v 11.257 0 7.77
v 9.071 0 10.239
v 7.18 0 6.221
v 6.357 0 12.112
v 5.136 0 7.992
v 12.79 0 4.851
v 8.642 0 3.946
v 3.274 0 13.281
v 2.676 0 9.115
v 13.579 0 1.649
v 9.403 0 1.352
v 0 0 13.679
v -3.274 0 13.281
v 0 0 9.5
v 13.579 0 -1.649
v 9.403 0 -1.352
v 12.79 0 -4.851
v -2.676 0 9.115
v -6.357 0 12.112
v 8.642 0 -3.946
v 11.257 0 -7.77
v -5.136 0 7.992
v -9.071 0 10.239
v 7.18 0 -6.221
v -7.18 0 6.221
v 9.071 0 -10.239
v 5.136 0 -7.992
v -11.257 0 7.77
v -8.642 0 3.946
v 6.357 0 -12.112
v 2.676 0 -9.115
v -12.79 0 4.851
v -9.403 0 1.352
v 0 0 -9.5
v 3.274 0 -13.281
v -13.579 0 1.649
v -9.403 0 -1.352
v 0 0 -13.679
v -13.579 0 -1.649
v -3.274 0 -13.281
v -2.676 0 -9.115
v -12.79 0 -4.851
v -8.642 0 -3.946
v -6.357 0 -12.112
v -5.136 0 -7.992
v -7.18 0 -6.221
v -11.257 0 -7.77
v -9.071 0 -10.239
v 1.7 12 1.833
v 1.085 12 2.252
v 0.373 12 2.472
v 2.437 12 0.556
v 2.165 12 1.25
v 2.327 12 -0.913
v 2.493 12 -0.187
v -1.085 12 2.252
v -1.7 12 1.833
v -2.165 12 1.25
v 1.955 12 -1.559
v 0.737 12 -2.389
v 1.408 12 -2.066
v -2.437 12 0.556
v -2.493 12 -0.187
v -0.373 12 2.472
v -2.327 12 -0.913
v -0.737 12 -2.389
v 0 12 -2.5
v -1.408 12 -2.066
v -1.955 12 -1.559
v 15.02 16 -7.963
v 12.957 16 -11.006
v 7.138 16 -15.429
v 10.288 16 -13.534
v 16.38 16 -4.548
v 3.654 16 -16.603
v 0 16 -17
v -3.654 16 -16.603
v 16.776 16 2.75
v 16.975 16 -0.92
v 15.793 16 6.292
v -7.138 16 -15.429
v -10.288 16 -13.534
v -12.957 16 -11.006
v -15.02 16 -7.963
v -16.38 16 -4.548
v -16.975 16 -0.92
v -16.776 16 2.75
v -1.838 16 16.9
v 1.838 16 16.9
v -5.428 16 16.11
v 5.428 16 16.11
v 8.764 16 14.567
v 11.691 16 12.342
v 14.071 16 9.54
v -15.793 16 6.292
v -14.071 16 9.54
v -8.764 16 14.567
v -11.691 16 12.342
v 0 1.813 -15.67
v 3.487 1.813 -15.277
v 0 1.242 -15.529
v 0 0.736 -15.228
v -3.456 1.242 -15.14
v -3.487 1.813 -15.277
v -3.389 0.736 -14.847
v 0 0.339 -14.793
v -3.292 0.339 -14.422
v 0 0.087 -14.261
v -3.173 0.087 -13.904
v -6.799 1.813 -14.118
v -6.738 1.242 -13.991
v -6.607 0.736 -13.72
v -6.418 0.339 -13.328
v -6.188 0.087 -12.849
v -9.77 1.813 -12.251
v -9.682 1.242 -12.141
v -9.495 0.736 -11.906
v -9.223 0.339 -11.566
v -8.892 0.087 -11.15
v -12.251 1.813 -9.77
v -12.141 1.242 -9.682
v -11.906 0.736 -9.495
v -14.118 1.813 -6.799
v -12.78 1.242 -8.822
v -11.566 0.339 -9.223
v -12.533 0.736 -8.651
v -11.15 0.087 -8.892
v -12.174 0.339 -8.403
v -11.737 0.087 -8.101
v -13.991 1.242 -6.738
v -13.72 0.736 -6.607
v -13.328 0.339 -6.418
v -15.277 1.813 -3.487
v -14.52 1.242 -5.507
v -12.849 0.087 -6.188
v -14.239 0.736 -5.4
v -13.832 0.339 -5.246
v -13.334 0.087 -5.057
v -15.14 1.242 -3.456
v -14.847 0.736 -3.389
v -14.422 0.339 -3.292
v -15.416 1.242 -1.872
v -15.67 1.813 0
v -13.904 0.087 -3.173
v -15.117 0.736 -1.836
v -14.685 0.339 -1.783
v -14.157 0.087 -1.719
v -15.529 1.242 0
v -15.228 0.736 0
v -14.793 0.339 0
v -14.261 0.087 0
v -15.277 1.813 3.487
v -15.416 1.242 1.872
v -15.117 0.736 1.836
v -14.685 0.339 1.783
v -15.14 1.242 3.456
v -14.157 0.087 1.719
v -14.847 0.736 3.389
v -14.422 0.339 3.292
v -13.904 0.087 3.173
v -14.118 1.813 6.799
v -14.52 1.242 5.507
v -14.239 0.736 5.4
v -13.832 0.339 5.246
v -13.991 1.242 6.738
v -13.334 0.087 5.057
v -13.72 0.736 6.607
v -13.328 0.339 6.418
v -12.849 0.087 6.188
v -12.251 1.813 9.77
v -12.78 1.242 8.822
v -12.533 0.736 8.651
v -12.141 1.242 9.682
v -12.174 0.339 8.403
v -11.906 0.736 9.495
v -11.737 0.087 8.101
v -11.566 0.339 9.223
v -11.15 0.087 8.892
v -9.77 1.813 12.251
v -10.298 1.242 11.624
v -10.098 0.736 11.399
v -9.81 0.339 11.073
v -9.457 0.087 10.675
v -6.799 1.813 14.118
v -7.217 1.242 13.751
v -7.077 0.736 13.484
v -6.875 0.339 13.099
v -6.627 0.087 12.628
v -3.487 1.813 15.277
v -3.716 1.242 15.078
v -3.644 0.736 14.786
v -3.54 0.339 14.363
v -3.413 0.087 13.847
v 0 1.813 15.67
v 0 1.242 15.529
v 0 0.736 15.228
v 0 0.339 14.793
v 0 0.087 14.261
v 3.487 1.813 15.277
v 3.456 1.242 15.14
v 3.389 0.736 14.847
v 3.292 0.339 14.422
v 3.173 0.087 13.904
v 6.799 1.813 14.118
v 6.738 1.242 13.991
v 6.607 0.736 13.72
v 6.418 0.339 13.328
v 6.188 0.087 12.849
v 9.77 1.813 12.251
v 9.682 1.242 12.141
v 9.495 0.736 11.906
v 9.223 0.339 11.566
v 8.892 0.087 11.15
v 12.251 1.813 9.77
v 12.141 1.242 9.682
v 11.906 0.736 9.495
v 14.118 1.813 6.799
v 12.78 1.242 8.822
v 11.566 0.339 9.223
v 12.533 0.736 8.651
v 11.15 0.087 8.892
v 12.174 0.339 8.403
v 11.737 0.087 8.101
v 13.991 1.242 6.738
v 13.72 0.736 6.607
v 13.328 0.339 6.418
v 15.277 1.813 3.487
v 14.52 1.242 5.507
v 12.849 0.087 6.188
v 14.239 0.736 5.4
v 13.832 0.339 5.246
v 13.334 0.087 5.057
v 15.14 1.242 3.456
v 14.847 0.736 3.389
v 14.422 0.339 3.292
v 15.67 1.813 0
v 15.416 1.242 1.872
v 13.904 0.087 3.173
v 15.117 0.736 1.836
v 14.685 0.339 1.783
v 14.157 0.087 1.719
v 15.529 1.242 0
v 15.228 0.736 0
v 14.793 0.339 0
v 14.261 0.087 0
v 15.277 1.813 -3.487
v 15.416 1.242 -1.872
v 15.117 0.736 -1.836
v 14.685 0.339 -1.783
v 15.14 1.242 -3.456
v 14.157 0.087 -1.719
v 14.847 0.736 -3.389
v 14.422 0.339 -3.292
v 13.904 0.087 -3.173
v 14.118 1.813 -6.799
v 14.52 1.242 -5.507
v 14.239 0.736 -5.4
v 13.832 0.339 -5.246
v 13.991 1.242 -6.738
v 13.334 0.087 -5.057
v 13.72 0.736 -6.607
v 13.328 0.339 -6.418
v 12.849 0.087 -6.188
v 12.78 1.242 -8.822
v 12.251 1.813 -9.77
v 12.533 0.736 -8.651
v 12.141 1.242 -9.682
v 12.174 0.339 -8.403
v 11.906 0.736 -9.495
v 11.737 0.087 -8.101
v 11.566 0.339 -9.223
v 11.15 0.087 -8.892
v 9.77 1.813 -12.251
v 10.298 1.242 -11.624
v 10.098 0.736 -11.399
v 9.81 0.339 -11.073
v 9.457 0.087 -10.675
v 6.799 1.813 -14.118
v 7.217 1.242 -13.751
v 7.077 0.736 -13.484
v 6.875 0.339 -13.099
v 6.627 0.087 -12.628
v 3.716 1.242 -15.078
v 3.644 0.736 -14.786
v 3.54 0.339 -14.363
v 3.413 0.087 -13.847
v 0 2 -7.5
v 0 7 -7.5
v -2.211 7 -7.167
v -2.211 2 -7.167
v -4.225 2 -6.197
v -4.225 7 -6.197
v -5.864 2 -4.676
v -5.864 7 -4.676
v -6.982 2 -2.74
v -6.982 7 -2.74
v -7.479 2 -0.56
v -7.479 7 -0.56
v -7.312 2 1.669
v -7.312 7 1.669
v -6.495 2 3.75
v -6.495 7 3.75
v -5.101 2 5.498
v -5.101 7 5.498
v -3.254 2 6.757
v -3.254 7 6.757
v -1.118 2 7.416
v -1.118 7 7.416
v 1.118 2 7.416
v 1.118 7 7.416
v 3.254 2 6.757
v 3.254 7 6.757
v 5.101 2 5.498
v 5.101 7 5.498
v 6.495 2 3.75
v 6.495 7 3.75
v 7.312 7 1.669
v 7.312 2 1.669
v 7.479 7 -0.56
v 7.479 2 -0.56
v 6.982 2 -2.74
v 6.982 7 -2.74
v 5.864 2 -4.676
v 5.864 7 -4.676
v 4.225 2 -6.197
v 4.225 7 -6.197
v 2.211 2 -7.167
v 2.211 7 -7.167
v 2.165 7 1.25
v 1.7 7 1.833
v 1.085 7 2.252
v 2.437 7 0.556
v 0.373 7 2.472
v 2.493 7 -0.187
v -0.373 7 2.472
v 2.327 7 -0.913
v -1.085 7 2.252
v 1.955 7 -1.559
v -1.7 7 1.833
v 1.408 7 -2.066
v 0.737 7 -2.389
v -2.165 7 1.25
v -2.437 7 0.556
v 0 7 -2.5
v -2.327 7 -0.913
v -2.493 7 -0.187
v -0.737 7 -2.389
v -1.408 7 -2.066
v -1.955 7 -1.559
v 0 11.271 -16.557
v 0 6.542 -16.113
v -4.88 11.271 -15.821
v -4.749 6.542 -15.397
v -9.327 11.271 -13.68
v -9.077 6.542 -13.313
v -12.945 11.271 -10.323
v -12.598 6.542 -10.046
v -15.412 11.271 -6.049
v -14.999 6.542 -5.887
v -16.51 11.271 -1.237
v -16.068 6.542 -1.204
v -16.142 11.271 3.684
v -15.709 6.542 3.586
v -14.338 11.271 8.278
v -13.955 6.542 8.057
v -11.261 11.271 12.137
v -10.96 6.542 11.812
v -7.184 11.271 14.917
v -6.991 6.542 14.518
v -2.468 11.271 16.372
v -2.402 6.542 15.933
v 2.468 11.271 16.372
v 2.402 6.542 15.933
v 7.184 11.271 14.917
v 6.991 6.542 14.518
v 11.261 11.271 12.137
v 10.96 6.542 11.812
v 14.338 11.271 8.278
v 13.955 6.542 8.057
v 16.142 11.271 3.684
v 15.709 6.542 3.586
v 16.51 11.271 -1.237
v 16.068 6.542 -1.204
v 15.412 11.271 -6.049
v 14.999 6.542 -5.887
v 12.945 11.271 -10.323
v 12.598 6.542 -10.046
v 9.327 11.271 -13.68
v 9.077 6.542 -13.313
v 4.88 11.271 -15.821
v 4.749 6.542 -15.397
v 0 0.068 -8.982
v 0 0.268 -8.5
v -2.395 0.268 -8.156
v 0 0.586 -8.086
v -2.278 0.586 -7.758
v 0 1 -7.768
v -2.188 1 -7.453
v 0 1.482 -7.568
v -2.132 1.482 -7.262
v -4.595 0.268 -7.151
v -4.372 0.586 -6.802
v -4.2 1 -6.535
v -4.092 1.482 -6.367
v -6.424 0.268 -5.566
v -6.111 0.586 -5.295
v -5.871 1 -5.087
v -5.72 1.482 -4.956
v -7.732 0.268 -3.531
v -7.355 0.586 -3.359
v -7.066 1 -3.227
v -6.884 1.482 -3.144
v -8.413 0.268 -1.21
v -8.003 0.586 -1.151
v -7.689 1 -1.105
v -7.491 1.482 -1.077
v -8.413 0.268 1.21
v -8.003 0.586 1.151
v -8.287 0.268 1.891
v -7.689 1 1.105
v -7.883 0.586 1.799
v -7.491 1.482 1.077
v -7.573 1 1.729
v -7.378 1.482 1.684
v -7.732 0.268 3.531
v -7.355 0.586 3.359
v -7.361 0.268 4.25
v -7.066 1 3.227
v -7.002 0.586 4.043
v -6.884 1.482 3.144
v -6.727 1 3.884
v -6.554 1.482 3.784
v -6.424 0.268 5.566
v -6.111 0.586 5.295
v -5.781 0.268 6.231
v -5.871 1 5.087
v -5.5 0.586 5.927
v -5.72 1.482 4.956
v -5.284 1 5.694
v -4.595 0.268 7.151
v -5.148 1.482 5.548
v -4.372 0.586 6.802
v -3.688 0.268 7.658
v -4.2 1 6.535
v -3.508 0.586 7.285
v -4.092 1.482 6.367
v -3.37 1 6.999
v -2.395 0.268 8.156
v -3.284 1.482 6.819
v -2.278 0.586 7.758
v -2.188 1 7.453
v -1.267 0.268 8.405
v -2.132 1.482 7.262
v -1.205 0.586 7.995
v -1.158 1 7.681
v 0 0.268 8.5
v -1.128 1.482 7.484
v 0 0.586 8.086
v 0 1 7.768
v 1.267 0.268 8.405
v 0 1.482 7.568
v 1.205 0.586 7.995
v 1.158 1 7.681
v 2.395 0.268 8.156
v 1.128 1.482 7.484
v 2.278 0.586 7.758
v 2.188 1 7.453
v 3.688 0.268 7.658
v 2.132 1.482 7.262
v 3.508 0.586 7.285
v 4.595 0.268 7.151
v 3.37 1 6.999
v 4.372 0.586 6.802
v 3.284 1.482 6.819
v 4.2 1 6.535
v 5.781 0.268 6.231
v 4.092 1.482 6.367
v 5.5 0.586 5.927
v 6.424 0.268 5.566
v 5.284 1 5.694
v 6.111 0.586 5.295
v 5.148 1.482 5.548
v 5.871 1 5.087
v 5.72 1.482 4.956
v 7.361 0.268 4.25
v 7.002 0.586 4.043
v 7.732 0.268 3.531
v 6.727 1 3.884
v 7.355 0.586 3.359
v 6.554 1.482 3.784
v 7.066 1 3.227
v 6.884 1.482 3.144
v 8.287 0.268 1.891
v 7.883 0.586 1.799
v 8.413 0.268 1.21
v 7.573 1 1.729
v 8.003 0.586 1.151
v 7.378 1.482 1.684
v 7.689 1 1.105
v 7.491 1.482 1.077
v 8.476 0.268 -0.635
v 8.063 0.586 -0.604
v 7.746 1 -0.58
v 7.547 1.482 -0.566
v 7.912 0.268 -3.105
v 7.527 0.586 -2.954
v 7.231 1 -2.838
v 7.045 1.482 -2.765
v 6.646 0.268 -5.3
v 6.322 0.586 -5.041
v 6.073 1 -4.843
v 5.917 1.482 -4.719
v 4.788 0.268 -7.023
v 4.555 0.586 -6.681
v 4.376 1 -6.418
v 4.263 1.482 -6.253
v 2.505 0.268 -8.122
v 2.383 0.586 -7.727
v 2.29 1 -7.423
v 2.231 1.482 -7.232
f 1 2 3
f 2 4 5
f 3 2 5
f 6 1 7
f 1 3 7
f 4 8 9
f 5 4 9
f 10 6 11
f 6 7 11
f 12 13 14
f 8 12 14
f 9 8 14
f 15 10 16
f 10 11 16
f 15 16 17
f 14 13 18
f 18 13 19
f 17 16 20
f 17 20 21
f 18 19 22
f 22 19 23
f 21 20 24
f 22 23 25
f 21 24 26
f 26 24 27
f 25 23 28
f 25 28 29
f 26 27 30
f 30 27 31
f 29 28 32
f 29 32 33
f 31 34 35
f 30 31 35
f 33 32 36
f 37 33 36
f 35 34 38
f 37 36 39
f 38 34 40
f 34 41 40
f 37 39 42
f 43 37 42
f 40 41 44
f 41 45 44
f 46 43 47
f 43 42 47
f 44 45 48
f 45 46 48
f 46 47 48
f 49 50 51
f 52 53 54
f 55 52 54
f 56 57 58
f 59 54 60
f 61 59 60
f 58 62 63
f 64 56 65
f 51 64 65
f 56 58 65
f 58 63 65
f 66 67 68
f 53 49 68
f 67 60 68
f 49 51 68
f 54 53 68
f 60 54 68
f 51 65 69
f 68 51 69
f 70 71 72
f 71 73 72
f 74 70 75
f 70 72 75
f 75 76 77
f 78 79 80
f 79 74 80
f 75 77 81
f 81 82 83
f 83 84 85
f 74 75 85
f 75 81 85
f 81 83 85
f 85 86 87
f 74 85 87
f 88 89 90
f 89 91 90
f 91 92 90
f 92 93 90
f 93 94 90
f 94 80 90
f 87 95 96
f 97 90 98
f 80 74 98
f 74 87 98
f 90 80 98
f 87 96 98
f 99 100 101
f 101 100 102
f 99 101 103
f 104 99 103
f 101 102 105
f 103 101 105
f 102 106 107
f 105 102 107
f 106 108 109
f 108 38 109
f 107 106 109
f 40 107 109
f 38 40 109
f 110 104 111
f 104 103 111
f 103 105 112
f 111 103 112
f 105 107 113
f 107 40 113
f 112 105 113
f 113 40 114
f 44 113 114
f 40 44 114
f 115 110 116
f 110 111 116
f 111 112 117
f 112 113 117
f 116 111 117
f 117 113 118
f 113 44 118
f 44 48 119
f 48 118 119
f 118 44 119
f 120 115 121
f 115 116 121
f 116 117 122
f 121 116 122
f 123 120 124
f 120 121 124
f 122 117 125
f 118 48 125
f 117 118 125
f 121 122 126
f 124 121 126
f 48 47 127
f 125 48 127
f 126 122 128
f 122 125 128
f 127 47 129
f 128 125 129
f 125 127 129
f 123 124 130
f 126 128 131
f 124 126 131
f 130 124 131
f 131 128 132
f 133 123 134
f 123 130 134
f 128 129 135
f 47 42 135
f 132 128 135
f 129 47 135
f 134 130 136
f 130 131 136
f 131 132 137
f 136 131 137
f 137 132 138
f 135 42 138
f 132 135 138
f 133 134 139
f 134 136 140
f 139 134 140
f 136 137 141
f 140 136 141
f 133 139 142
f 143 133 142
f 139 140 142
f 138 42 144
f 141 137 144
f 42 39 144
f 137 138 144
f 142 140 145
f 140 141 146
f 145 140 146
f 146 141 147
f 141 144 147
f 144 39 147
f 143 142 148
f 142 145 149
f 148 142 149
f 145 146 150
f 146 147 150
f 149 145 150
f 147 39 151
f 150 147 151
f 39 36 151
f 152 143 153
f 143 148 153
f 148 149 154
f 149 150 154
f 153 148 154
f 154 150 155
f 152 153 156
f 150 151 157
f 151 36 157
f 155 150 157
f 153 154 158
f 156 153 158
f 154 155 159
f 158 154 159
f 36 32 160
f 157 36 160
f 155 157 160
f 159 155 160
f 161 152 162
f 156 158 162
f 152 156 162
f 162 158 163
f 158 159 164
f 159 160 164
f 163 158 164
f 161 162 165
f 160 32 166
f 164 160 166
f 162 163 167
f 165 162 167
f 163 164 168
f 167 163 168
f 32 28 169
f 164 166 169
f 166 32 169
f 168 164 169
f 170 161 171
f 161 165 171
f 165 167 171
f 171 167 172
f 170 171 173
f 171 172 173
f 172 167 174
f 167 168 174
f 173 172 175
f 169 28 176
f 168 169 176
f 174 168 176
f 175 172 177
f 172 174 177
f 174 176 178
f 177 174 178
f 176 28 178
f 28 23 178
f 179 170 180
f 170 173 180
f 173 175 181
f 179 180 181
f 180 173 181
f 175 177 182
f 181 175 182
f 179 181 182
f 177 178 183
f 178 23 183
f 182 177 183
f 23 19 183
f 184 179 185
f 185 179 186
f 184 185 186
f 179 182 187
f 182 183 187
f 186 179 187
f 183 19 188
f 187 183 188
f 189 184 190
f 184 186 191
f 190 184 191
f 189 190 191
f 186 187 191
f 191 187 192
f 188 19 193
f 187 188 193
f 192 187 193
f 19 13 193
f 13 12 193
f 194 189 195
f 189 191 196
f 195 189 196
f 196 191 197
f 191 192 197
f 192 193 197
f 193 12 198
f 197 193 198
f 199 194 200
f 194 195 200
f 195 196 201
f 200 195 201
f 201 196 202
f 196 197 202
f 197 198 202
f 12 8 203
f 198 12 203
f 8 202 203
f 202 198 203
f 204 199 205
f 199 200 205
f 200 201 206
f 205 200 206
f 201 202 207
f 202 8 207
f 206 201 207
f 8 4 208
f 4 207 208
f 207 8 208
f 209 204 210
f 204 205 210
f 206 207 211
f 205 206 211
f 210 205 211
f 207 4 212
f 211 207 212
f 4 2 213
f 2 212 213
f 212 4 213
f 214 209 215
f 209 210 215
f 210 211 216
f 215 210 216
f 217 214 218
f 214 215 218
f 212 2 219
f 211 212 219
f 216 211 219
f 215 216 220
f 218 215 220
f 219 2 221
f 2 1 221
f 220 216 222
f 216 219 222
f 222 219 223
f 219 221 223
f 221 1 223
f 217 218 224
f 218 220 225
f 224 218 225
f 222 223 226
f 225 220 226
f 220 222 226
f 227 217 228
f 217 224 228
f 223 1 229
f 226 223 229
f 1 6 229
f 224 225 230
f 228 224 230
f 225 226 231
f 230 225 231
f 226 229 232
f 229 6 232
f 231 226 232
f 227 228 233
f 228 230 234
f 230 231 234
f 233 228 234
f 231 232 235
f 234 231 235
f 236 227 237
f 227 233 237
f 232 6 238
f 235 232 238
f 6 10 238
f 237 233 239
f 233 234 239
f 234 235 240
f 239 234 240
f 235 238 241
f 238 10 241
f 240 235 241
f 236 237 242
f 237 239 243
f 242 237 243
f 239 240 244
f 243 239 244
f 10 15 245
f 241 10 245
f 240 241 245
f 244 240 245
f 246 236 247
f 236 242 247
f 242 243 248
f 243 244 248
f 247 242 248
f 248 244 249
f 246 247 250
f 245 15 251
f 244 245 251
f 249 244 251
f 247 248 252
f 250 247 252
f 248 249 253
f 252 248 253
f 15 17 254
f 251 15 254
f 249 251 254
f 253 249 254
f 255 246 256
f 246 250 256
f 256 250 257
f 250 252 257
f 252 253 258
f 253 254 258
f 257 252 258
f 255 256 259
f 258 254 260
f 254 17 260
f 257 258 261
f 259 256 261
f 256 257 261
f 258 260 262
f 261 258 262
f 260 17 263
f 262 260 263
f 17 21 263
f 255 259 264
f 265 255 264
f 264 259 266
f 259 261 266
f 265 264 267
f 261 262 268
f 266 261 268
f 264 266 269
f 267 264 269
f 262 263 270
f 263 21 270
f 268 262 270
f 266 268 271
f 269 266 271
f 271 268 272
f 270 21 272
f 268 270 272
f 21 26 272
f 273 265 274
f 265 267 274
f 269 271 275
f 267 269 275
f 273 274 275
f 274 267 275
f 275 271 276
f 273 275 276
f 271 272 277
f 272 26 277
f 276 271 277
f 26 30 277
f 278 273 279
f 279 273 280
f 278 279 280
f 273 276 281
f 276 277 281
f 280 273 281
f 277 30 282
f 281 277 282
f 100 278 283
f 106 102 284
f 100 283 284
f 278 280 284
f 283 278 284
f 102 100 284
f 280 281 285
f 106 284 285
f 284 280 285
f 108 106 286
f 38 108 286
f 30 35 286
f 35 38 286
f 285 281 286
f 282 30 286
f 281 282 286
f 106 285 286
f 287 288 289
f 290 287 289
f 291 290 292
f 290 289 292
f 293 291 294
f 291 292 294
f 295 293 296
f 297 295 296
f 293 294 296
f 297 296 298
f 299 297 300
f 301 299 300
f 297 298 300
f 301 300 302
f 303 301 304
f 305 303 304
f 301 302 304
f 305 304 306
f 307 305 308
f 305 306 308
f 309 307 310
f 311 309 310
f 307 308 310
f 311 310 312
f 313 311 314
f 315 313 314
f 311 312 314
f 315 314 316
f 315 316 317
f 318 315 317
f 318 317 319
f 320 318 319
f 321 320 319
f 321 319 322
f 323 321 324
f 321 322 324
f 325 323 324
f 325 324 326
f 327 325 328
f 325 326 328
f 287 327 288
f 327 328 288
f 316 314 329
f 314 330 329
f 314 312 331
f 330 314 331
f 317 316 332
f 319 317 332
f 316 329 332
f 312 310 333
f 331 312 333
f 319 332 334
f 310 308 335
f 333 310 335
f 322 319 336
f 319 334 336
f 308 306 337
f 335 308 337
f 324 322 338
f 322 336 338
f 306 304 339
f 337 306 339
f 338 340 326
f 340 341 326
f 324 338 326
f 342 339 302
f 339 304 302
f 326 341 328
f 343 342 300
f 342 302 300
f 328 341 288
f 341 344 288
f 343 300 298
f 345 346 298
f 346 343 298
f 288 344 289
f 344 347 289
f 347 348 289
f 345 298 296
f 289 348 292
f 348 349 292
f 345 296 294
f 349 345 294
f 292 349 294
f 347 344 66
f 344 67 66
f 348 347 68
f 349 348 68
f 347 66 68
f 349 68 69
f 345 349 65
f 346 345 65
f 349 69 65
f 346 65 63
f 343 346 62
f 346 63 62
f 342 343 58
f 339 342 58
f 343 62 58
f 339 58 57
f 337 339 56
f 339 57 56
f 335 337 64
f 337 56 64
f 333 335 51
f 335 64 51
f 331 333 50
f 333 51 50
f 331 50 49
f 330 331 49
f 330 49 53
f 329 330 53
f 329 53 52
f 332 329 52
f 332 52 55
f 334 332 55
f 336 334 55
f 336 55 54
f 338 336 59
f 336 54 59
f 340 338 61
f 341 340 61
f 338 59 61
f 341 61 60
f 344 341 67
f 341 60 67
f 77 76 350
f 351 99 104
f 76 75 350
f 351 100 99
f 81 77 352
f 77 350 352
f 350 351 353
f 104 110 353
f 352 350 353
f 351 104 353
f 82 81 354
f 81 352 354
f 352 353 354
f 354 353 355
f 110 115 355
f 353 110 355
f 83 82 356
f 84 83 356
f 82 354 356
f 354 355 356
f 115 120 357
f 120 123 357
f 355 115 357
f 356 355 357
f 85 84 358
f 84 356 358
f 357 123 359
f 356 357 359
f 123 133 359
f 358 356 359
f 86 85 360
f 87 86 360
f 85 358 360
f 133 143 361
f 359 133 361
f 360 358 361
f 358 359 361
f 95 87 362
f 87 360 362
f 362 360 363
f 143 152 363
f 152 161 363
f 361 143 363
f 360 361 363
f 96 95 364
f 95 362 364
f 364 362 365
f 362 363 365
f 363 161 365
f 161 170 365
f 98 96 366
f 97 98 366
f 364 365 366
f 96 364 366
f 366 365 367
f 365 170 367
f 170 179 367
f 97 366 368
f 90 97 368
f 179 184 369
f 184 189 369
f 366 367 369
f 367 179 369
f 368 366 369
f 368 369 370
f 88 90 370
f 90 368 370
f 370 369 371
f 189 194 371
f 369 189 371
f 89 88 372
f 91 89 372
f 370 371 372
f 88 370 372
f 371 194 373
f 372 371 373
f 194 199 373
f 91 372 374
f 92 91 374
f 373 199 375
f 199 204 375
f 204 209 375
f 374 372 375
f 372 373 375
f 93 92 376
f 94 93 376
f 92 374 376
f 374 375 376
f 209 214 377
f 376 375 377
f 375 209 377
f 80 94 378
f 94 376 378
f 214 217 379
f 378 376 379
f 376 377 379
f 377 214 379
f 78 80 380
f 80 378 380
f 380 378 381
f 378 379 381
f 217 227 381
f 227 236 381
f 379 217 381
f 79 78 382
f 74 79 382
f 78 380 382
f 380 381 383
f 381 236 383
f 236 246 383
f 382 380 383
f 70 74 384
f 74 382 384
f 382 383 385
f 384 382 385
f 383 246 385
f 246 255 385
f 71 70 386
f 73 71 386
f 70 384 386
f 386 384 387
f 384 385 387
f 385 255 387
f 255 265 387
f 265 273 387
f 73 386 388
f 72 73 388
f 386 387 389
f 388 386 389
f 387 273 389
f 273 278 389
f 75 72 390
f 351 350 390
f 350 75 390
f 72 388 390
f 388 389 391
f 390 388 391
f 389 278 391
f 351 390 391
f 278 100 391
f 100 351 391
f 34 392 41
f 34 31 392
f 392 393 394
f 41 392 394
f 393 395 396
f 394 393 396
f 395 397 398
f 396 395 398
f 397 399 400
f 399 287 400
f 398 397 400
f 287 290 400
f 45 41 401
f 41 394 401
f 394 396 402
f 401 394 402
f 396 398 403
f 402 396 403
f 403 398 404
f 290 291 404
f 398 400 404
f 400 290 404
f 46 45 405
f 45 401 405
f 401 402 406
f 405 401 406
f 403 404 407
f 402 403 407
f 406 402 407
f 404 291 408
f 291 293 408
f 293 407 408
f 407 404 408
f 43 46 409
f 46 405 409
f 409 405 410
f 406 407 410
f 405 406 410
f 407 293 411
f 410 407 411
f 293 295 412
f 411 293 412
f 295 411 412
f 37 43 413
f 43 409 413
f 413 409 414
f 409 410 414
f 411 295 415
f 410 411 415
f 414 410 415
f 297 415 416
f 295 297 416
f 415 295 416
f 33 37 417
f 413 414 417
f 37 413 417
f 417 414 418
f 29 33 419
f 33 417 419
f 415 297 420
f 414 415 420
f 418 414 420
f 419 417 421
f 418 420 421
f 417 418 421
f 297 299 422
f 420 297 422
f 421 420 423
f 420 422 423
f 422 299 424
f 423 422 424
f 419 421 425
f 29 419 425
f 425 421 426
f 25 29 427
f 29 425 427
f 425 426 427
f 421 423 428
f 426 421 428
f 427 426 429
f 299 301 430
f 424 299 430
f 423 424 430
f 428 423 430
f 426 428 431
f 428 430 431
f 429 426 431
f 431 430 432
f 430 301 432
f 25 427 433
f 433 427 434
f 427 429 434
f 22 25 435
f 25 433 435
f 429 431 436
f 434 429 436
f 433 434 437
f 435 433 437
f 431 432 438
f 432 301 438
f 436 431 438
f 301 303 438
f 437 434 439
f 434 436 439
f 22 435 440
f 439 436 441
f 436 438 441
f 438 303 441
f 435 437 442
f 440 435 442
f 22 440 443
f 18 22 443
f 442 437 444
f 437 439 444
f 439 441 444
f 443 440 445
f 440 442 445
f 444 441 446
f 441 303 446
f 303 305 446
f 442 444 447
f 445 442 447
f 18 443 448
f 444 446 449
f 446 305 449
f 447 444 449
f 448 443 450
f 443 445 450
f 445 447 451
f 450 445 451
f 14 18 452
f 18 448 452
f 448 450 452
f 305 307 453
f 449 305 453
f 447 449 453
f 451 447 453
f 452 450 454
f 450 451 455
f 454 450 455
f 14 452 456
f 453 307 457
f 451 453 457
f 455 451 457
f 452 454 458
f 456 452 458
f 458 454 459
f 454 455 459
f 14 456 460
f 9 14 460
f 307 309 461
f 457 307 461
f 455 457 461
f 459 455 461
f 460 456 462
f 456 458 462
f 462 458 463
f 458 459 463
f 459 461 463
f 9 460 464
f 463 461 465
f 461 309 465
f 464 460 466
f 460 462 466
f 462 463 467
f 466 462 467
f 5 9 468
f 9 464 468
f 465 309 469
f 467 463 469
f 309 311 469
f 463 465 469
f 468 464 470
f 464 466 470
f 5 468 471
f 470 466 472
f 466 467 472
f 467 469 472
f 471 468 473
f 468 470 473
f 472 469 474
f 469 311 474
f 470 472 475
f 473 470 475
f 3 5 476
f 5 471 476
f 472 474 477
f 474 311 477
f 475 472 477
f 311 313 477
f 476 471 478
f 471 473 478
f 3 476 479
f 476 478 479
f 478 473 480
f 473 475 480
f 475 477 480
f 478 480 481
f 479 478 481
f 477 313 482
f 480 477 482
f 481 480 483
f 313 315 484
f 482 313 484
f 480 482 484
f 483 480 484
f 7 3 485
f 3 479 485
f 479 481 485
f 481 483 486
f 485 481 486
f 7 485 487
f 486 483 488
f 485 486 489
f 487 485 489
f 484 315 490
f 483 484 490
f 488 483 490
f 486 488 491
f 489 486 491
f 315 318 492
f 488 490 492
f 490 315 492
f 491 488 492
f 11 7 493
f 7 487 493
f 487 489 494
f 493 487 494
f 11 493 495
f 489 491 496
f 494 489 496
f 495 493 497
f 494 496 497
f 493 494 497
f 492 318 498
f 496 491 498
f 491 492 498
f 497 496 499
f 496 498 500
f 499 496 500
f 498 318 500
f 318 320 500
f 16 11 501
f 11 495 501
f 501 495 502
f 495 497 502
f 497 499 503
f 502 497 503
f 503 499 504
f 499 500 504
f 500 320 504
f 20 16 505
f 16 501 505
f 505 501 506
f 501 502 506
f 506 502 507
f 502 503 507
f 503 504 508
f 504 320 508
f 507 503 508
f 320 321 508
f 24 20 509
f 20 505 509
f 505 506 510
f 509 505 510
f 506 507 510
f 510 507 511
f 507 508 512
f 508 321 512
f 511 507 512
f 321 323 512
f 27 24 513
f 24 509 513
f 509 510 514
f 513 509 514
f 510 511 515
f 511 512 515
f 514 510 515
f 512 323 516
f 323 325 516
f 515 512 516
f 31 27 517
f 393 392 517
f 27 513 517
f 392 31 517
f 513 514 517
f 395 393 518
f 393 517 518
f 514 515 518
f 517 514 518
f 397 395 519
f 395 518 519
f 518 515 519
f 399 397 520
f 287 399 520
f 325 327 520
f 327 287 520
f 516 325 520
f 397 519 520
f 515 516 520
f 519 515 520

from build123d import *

# Parameters (mm, degrees)
REDONDEO1_R = 2


with BuildPart() as part:
    # Croquis1 → Revolución1 (revolve)
    with BuildSketch(Plane(origin=(0, 0, 0), x_dir=(0, 0, -1), z_dir=(1, 0, 0)), mode=Mode.PRIVATE) as revoluci_n1_sk:
        Polygon((0, 16), (-17, 16), (-15.5, 0), (-7.5, 0), (-7.5, 7), (-2.5, 7), (-2.5, 12), (0, 12), align=None)
    revolve(revoluci_n1_sk.sketch.rotate(Axis((0, 0, 0), (0, 1, 0)), 180), axis=Axis((0, 0, 0), (0, 1, 0)))

    # Redondeo1
    redondeo1_edges = [part.edges().sort_by_distance(p)[0] for p in [
        (0, 0, 7.5),
        (0, 0, 15.5),
    ]]
    fillet(redondeo1_edges, radius=REDONDEO1_R)


solid = part.part
